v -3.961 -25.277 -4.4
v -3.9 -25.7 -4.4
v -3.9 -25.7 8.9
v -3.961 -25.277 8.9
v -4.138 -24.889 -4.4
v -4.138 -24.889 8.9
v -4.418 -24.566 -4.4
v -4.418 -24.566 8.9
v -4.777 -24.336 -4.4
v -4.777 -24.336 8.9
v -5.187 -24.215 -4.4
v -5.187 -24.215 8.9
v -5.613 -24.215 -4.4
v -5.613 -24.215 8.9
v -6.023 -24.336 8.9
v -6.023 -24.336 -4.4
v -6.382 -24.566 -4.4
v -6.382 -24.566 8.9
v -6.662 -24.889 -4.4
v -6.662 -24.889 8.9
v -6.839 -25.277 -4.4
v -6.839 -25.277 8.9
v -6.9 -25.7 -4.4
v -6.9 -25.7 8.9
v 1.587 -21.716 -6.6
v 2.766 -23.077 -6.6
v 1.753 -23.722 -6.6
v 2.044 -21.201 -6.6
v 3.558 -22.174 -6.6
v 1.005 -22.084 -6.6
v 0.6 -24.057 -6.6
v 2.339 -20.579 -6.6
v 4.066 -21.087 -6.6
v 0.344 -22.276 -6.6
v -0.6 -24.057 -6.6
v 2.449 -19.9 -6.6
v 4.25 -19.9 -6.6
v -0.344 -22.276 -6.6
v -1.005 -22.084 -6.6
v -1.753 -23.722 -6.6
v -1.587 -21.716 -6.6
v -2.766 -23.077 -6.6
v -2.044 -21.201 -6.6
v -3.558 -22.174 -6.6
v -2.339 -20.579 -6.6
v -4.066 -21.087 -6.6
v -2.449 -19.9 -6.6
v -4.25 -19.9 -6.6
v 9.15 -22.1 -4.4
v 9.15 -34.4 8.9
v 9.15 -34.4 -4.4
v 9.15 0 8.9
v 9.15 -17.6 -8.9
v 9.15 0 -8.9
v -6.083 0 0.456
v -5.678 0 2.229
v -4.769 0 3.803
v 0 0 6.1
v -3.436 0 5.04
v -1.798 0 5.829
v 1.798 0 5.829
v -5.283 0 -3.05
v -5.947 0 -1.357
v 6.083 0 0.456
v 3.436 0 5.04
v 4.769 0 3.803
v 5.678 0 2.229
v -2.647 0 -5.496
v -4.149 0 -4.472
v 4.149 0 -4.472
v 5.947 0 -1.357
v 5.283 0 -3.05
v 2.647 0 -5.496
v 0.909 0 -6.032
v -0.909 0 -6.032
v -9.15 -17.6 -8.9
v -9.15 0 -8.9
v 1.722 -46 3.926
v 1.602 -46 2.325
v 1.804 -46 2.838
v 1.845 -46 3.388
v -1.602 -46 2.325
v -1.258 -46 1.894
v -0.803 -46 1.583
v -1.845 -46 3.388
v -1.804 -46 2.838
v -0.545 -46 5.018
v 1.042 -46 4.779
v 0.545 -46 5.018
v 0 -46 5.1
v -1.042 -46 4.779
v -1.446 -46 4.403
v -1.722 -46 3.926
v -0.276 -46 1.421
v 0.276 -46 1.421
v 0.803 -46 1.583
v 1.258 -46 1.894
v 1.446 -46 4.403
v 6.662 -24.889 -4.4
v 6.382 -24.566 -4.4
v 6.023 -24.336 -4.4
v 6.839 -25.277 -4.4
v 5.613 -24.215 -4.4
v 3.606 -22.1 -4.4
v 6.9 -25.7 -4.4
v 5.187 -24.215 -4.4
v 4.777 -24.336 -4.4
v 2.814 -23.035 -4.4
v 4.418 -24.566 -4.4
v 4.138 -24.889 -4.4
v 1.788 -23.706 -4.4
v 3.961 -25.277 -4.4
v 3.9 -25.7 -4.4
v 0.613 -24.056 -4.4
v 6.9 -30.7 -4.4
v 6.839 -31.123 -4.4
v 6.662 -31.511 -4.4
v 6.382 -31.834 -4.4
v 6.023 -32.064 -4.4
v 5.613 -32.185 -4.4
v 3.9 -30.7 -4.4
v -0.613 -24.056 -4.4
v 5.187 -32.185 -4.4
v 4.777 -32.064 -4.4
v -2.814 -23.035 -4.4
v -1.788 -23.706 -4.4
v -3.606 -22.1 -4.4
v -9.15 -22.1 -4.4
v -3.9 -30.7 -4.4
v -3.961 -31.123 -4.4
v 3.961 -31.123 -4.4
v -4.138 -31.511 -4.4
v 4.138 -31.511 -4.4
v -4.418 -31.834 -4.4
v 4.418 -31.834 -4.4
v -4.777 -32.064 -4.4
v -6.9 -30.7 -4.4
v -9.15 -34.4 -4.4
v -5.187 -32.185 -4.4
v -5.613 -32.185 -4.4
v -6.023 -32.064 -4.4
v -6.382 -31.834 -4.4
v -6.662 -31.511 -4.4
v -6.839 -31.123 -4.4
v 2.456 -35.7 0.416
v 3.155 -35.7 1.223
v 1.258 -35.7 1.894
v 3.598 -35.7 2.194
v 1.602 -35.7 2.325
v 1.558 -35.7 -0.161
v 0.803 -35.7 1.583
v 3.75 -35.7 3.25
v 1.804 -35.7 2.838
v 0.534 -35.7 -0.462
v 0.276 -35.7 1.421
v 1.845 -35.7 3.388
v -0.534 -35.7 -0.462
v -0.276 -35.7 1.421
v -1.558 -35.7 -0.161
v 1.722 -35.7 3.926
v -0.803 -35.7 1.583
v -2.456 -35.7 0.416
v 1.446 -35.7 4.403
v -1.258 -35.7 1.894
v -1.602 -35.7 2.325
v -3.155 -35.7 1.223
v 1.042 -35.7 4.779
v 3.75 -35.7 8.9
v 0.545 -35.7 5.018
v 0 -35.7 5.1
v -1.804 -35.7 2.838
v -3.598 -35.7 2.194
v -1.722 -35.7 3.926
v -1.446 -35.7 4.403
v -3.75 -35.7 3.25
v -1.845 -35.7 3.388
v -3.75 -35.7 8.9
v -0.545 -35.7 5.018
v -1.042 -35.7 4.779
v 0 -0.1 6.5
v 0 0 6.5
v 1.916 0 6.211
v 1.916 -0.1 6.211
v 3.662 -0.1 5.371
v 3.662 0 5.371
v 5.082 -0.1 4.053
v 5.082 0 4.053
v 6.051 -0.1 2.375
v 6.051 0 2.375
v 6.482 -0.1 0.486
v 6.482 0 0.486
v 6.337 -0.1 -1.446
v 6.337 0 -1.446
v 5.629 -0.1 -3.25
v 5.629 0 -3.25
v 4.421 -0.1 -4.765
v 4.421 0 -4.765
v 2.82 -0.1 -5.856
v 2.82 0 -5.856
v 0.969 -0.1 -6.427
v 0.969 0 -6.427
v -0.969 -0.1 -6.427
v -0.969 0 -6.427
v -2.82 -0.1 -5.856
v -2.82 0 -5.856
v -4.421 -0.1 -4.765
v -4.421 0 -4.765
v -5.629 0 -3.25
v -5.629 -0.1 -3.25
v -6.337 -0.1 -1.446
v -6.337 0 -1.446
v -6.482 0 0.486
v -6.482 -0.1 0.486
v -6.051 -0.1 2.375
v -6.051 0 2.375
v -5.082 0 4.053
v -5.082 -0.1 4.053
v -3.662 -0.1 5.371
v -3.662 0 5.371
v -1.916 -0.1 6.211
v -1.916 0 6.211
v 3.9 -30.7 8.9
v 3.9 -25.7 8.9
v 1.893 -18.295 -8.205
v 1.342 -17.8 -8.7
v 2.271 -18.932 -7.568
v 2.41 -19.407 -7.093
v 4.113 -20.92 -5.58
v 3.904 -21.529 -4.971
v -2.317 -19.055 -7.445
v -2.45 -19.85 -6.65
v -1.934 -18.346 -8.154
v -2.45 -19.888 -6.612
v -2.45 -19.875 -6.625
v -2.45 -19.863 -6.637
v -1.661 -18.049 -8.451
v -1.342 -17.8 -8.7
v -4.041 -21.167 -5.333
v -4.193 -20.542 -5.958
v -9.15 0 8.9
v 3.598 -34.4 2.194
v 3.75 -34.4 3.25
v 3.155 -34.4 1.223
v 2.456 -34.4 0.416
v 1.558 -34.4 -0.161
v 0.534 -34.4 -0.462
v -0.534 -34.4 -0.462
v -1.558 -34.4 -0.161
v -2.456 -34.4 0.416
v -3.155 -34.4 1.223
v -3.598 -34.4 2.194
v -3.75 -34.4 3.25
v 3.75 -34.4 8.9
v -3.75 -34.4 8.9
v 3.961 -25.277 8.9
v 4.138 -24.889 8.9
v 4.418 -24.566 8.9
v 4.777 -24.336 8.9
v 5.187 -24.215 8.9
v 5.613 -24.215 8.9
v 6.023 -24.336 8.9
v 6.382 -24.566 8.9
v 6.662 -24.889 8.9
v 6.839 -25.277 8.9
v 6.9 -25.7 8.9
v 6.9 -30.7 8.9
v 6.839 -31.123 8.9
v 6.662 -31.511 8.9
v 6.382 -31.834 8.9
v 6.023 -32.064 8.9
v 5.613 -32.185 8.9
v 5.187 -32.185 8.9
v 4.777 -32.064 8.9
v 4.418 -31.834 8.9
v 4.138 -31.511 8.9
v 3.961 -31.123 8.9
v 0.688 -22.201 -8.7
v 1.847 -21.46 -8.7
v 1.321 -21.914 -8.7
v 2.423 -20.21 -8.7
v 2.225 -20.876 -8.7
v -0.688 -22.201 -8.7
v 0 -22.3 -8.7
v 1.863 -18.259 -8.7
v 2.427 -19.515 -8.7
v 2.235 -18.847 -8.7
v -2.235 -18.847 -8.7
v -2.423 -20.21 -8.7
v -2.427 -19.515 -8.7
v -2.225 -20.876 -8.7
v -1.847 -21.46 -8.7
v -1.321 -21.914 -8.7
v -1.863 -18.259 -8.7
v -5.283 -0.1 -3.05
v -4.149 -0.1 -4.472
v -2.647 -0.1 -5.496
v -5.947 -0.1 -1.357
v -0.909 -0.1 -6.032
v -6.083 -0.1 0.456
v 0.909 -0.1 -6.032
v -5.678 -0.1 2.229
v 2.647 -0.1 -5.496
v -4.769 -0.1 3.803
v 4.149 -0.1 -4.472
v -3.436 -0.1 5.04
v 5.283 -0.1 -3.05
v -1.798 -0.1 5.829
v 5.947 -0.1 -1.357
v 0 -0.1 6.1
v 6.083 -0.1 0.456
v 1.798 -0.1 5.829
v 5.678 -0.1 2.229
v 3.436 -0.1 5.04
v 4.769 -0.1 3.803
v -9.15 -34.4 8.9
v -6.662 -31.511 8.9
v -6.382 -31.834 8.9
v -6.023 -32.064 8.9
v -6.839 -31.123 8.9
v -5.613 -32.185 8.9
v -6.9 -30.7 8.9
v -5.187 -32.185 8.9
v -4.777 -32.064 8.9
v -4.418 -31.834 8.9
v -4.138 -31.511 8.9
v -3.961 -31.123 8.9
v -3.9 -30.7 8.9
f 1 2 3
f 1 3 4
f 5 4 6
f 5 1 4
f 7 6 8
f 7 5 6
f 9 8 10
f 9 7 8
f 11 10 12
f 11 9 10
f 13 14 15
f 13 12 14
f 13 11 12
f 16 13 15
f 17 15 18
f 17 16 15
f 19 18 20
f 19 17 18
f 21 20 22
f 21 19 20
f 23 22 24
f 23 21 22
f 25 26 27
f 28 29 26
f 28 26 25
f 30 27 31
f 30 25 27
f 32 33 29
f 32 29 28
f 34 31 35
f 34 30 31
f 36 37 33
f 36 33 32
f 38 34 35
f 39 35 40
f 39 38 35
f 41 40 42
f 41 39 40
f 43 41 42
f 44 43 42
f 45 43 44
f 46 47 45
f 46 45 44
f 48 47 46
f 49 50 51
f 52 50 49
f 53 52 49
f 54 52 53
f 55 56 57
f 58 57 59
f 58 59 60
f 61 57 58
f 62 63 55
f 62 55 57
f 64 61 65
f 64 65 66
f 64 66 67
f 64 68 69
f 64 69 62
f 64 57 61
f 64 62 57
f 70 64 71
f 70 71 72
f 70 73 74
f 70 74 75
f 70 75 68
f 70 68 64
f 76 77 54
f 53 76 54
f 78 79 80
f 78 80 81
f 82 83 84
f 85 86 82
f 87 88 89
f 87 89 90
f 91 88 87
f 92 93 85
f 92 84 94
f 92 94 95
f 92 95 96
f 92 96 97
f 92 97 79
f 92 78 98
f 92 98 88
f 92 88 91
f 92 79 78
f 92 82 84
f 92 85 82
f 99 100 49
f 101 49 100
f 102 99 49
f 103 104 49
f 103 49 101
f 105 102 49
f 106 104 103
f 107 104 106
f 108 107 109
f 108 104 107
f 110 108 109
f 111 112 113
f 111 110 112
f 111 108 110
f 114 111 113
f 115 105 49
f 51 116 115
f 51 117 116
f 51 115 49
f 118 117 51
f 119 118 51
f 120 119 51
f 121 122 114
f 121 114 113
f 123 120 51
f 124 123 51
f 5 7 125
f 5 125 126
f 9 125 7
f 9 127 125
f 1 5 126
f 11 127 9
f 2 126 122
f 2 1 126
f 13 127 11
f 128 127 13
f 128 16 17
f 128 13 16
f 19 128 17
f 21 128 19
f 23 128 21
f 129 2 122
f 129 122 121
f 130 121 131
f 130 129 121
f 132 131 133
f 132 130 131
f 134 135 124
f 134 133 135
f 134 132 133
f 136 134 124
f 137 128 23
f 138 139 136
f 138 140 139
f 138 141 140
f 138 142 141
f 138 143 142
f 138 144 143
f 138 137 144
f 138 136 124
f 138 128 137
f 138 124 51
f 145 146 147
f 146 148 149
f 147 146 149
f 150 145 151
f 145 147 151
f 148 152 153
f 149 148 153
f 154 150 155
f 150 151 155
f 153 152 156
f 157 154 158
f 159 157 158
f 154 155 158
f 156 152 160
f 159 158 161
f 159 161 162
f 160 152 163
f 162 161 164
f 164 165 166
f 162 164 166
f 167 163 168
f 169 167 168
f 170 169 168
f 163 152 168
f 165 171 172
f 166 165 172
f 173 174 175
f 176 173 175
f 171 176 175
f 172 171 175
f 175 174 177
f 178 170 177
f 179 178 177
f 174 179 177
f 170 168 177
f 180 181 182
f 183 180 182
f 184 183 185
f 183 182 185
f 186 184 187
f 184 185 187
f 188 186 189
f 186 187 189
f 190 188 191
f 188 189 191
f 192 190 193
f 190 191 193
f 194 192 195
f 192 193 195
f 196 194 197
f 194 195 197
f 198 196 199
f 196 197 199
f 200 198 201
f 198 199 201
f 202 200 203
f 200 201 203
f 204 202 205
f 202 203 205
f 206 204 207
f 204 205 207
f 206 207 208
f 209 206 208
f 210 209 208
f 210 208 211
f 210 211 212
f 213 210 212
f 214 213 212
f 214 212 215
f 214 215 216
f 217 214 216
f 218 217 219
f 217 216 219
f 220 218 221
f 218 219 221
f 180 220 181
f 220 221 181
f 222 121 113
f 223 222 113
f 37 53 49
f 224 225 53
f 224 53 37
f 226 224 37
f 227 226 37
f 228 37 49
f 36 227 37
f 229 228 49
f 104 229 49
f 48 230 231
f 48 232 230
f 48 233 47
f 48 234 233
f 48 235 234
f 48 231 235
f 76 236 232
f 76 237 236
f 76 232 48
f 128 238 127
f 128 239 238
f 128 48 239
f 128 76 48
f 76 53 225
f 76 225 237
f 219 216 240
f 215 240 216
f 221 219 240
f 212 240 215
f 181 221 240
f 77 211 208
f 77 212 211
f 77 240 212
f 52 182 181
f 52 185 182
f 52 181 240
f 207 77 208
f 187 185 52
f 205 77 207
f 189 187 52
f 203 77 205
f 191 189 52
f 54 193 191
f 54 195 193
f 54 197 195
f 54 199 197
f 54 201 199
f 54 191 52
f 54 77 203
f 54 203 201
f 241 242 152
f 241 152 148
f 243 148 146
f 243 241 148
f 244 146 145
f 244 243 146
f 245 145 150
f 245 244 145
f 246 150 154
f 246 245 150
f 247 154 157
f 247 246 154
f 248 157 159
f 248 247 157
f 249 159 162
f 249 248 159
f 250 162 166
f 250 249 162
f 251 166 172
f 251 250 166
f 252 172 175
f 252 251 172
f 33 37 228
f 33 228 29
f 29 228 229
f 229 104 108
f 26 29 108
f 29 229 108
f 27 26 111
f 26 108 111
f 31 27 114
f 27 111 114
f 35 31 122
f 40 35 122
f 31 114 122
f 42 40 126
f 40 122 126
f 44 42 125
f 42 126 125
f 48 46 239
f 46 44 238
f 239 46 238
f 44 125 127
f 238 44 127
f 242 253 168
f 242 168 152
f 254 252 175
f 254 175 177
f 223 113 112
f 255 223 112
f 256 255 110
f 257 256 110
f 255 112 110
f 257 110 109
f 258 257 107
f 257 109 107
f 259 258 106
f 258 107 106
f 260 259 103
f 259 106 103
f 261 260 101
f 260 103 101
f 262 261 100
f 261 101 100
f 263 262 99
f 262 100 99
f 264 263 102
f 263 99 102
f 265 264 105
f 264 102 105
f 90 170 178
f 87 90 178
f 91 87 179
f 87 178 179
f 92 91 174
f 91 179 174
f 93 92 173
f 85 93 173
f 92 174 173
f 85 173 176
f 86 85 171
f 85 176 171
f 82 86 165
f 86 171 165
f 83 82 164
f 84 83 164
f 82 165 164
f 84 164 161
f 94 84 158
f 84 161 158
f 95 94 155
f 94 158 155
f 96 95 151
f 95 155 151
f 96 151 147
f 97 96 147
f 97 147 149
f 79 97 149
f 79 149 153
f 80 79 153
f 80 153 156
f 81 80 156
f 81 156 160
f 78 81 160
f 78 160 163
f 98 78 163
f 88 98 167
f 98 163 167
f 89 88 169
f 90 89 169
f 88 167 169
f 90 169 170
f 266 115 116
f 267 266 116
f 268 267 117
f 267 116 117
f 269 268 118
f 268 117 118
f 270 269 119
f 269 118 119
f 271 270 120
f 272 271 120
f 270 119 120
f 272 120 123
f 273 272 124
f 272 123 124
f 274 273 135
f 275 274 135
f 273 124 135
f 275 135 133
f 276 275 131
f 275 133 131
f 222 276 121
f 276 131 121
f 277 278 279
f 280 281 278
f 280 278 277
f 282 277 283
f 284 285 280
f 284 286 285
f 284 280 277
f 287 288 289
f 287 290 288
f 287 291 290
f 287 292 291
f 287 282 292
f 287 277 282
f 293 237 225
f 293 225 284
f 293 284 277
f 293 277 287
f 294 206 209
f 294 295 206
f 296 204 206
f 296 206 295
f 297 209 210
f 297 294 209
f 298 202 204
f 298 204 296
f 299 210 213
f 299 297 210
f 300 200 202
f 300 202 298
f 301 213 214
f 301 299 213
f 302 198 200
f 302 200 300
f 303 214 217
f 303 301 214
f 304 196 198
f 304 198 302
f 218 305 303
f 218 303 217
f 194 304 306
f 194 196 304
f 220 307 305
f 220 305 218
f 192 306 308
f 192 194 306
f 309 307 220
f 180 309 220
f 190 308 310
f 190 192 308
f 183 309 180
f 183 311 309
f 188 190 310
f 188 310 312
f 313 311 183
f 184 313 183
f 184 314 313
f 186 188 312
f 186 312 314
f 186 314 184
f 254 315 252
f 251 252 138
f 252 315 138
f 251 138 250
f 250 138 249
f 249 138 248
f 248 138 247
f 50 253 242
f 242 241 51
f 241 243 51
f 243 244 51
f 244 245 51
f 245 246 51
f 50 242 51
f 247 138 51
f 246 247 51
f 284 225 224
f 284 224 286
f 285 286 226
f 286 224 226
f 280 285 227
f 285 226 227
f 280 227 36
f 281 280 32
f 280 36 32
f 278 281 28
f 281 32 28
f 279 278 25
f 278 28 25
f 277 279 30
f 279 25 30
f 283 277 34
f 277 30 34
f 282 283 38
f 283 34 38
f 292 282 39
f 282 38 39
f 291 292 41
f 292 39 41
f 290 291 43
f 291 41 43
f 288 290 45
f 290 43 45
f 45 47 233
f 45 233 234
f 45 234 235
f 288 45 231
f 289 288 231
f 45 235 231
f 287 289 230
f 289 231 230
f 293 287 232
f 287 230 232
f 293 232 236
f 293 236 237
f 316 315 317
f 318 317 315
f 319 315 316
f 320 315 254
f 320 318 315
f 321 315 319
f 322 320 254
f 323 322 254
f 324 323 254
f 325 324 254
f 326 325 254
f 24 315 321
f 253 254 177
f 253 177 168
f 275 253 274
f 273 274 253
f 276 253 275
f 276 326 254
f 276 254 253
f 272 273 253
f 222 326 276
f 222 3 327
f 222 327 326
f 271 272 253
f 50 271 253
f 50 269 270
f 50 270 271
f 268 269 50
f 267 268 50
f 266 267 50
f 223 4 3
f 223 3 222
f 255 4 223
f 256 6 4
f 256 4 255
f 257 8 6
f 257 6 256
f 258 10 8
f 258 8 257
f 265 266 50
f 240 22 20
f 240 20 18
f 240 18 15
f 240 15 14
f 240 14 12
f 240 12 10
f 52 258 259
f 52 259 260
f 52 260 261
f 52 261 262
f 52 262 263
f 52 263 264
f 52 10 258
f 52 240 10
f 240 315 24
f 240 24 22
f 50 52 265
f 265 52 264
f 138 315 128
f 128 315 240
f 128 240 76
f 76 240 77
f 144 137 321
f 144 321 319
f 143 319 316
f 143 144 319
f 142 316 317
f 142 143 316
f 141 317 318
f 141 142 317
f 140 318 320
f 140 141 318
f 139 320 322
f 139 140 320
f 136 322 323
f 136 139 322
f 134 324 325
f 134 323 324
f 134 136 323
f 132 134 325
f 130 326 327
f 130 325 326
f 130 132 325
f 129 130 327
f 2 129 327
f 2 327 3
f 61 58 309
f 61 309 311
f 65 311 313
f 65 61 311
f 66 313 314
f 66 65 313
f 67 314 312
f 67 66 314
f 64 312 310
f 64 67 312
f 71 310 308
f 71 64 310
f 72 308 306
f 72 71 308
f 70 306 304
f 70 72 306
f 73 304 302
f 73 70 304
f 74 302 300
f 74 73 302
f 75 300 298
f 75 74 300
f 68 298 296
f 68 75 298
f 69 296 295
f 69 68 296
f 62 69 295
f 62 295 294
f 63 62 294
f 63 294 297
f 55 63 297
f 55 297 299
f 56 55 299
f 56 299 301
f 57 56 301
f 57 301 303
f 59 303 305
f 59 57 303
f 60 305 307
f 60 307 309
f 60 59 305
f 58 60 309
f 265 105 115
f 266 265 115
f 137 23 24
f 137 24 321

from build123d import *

# Parameters (mm, degrees)
ESQUISSE1_W                  = 18.3
ESQUISSE1_H                  = 17.8
BOSS_EXTRU_1_DEPTH           = 34.4
ENL_V_MAT_EXTRU_1_DEPTH      = 37.69185877
ENL_V_MAT_EXTRU_1_DEPTH_BACK = 37.69185877
ENL_V_MAT_EXTRU_2_DEPTH      = 37.69185877
ENL_V_MAT_EXTRU_2_DEPTH_BACK = 37.69185877
ESQUISSE4_R                  = 4.25
BOSS_EXTRU_2_DEPTH           = 2.2
ESQUISSE5_R                  = 2.45
BOSS_EXTRU_3_DEPTH           = 2.1
BOSS_EXTRU_4_DEPTH           = 1.3
ESQUISSE7_R                  = 1.85
BOSS_EXTRU_5_DEPTH           = 10.3
ESQUISSE8_R                  = 6.5
ESQUISSE8_R_2                = 6.1
ENL_V_MAT_EXTRU_3_DEPTH      = 0.1


with BuildPart() as part:
    # Esquisse1 → Boss.-Extru.1 (new body)
    with BuildSketch(Plane(origin=(0, 0, 0), x_dir=(1, 0, 0), z_dir=(0, 1, 0))):
        Rectangle(ESQUISSE1_W, ESQUISSE1_H)
    extrude(amount=-BOSS_EXTRU_1_DEPTH)

    # Esquisse2 → Enlèv. mat.-Extru.1 (cut, two sides: drawn at the far end of the back side and taken through both)
    with BuildSketch(Plane(origin=(0, 0, 0), x_dir=(0, 0, -1), z_dir=(1, 0, 0)).offset(-ENL_V_MAT_EXTRU_1_DEPTH_BACK)):
        Polygon((8.9, -17.6), (4.4, -22.1), (4.4, -34.4), (8.9, -34.4), align=None)
    extrude(amount=ENL_V_MAT_EXTRU_1_DEPTH + ENL_V_MAT_EXTRU_1_DEPTH_BACK, mode=Mode.SUBTRACT)

    # Esquisse3 → Enlèv. mat.-Extru.2 (cut, two sides: drawn at the far end of the back side and taken through both)
    with BuildSketch(Plane.XY.offset(-ENL_V_MAT_EXTRU_2_DEPTH_BACK)):
        with BuildLine():
            Line((3.9, -30.7), (3.9, -25.7))
            ThreePointArc((3.9, -25.7), (5.4, -24.2), (6.9, -25.7))
            Line((6.9, -25.7), (6.9, -30.7))
            ThreePointArc((6.9, -30.7), (5.4, -32.2), (3.9, -30.7))
        make_face()
        with BuildLine():
            Line((-3.9, -30.7), (-3.9, -25.7))
            ThreePointArc((-3.9, -25.7), (-5.4, -24.2), (-6.9, -25.7))
            Line((-6.9, -25.7), (-6.9, -30.7))
            ThreePointArc((-6.9, -30.7), (-5.4, -32.2), (-3.9, -30.7))
        make_face()
    extrude(amount=ENL_V_MAT_EXTRU_2_DEPTH + ENL_V_MAT_EXTRU_2_DEPTH_BACK, mode=Mode.SUBTRACT)

    # Esquisse4 → Boss.-Extru.2 (add)
    with BuildSketch(Plane(origin=(0, 0, -4.4), x_dir=(-1, 0, 0), z_dir=(0, 0, -1))):
        with Locations((0, -19.85)):
            Circle(ESQUISSE4_R)
    extrude(amount=BOSS_EXTRU_2_DEPTH)

    # Esquisse5 → Boss.-Extru.3 (add)
    with BuildSketch(Plane(origin=(0, 0, -6.6), x_dir=(-1, 0, 0), z_dir=(0, 0, -1))):
        with Locations((0, -19.85)):
            Circle(ESQUISSE5_R)
    extrude(amount=BOSS_EXTRU_3_DEPTH)

    # Esquisse6 → Boss.-Extru.4 (add)
    with BuildSketch(Plane.XZ.offset(34.4)):
        with BuildLine():
            Line((3.75, 8.9), (3.75, 3.25))
            ThreePointArc((3.75, 3.25), (0, -0.5), (-3.75, 3.25))
            Line((-3.75, 3.25), (-3.75, 8.9))
            Line((-3.75, 8.9), (3.75, 8.9))
        make_face()
    extrude(amount=BOSS_EXTRU_4_DEPTH)

    # Esquisse7 → Boss.-Extru.5 (add)
    with BuildSketch(Plane.XZ.offset(35.7)):
        with Locations(Location((0, 3.25, 0), (0, 0, 90))):
            Circle(ESQUISSE7_R)
    extrude(amount=BOSS_EXTRU_5_DEPTH)

    # Esquisse8 → Enlèv. mat.-Extru.3 (cut)
    with BuildSketch(Plane(origin=(0, 0, 0), x_dir=(1, 0, 0), z_dir=(0, 1, 0))):
        with Locations(Location((0, 0, 0), (0, 0, 270))):
            Circle(ESQUISSE8_R)
        with Locations(Location((0, 0, 0), (0, 0, 270))):
            Circle(ESQUISSE8_R_2, mode=Mode.SUBTRACT)
    extrude(amount=-ENL_V_MAT_EXTRU_3_DEPTH, mode=Mode.SUBTRACT)


solid = part.part
